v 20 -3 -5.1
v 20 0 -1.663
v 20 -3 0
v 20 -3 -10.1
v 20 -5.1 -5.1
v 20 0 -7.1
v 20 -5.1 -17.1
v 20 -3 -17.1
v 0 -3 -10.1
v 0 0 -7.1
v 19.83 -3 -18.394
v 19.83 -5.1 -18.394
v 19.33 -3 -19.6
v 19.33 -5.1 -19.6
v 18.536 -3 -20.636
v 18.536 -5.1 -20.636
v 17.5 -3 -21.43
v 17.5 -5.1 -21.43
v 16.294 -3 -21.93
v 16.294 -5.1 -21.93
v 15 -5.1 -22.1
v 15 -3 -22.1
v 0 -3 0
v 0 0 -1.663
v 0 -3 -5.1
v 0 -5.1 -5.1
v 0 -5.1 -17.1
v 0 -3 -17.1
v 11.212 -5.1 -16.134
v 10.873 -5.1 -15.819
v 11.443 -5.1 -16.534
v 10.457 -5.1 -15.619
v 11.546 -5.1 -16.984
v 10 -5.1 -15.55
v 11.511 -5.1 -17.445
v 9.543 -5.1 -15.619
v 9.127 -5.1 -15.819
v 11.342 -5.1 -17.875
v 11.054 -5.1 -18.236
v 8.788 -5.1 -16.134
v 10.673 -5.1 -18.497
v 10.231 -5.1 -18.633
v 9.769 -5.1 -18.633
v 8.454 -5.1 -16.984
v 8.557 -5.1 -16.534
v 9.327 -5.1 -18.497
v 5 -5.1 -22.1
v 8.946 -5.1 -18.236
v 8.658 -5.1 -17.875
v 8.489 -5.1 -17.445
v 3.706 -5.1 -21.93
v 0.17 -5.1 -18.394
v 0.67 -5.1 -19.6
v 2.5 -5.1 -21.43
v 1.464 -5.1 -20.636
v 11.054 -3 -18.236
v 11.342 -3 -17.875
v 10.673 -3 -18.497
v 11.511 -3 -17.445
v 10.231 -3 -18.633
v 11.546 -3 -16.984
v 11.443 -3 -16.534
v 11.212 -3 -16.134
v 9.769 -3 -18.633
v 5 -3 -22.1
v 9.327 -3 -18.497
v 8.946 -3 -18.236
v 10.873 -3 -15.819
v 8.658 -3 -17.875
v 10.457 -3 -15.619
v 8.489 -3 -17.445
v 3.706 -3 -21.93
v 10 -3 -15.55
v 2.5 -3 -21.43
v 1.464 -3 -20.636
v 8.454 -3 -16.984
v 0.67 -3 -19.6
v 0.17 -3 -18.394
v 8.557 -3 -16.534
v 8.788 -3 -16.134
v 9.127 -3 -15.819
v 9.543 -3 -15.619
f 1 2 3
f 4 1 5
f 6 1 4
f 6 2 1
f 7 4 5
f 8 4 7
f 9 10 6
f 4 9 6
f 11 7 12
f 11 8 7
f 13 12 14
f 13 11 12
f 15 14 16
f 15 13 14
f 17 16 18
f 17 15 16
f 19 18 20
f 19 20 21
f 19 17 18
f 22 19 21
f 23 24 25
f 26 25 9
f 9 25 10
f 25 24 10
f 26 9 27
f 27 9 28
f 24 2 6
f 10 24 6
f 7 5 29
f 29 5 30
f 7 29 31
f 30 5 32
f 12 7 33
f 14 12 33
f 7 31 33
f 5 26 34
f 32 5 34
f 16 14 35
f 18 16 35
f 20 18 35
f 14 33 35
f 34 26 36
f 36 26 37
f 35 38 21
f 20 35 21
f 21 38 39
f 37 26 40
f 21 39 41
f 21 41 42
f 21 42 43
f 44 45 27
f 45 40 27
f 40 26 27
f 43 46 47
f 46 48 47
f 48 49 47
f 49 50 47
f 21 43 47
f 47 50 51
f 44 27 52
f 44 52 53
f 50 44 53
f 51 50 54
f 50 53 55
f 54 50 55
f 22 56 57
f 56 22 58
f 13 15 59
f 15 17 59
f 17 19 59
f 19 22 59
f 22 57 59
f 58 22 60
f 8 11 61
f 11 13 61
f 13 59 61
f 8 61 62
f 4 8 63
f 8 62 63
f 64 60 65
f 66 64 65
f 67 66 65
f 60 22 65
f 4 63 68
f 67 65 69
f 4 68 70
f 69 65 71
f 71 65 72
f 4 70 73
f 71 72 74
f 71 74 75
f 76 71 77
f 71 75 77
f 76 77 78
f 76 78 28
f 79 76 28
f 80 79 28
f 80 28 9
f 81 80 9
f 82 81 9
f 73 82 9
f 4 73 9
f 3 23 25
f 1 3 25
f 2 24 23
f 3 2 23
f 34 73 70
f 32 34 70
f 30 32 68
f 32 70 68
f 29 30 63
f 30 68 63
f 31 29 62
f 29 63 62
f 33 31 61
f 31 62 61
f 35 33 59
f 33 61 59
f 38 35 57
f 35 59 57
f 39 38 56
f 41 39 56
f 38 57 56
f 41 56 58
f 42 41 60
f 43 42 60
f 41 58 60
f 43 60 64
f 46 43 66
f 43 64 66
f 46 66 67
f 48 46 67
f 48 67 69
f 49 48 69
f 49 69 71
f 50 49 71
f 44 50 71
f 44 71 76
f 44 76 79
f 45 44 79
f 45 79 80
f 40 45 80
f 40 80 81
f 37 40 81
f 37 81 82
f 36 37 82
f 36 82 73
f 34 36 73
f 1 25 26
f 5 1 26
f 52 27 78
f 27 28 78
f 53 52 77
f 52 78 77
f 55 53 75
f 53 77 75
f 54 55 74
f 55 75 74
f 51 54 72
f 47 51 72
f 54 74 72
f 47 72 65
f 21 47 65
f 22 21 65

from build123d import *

# Parameters (mm, degrees)
SKETCH1_W           = 7.1
SKETCH1_H           = 3
BOSS_EXTRUDE1_DEPTH = 20
SKETCH2_R           = 1.55
CUT_EXTRUDE1_DEPTH  = 20
FILLET1_R           = 5
CHAMFER1_SIZE       = 3
CHAMFER2_SIZE       = 1.662927154
CHAMFER2_SIZE_2     = 3


# Some blends are built 0.0001 mm under size
with BuildPart() as part:
    # Sketch1 → Boss-Extrude1 (new body)
    with BuildSketch(Plane(origin=(0, 0, 0), x_dir=(0, 0, -1), z_dir=(1, 0, 0))):
        with Locations((3.55, -1.5)):
            Rectangle(SKETCH1_W, SKETCH1_H)
        Polygon((22.1, -3), (7.1, -3), (5.1, -3), (5.1, -5.1), (22.1, -5.1), align=None)
    extrude(amount=BOSS_EXTRUDE1_DEPTH)

    # Sketch2 → Cut-Extrude1 (cut)
    with BuildSketch(Plane(origin=(0, -3, 0), x_dir=(1, 0, 0), z_dir=(0, 1, 0))):
        with Locations(Location((10, 17.1, 0), (0, 0, 270))):
            Circle(SKETCH2_R)
    extrude(amount=-CUT_EXTRUDE1_DEPTH, mode=Mode.SUBTRACT)

    # Fillet1
    fillet1_edges = [part.edges().sort_by_distance(p)[0] for p in [
        (0, -4.05, -22.1),
        (20, -4.05, -22.1),
    ]]
    fillet(fillet1_edges, radius=FILLET1_R)

    # Chamfer1
    chamfer1_edges = [part.edges().sort_by_distance(p)[0] for p in [
        (10, -3, -7.1),
    ]]
    chamfer(chamfer1_edges, length=CHAMFER1_SIZE - 0.0001)  # a hair under: the kernel refuses the full size

    # Chamfer2
    # the kernel refuses this chamfer: 3, 1.662927154 mm, written as the material it takes off along each edge
    with BuildSketch(Plane(origin=(-7.763748365, 0, 0), x_dir=(0, 0.06086775916528878, -0.9981458389905739), z_dir=(1, 0, 0))) as chamfer2_piece_1:
        Polygon((CHAMFER2_SIZE * 0.998145839206, -CHAMFER2_SIZE * 0.0608677591784), (-CHAMFER2_SIZE_2 * 0.0608677591653, -CHAMFER2_SIZE_2 * 0.998145838991), (0, 0), align=None)
    extrude(amount=35.527496731, mode=Mode.SUBTRACT)


solid = part.part
